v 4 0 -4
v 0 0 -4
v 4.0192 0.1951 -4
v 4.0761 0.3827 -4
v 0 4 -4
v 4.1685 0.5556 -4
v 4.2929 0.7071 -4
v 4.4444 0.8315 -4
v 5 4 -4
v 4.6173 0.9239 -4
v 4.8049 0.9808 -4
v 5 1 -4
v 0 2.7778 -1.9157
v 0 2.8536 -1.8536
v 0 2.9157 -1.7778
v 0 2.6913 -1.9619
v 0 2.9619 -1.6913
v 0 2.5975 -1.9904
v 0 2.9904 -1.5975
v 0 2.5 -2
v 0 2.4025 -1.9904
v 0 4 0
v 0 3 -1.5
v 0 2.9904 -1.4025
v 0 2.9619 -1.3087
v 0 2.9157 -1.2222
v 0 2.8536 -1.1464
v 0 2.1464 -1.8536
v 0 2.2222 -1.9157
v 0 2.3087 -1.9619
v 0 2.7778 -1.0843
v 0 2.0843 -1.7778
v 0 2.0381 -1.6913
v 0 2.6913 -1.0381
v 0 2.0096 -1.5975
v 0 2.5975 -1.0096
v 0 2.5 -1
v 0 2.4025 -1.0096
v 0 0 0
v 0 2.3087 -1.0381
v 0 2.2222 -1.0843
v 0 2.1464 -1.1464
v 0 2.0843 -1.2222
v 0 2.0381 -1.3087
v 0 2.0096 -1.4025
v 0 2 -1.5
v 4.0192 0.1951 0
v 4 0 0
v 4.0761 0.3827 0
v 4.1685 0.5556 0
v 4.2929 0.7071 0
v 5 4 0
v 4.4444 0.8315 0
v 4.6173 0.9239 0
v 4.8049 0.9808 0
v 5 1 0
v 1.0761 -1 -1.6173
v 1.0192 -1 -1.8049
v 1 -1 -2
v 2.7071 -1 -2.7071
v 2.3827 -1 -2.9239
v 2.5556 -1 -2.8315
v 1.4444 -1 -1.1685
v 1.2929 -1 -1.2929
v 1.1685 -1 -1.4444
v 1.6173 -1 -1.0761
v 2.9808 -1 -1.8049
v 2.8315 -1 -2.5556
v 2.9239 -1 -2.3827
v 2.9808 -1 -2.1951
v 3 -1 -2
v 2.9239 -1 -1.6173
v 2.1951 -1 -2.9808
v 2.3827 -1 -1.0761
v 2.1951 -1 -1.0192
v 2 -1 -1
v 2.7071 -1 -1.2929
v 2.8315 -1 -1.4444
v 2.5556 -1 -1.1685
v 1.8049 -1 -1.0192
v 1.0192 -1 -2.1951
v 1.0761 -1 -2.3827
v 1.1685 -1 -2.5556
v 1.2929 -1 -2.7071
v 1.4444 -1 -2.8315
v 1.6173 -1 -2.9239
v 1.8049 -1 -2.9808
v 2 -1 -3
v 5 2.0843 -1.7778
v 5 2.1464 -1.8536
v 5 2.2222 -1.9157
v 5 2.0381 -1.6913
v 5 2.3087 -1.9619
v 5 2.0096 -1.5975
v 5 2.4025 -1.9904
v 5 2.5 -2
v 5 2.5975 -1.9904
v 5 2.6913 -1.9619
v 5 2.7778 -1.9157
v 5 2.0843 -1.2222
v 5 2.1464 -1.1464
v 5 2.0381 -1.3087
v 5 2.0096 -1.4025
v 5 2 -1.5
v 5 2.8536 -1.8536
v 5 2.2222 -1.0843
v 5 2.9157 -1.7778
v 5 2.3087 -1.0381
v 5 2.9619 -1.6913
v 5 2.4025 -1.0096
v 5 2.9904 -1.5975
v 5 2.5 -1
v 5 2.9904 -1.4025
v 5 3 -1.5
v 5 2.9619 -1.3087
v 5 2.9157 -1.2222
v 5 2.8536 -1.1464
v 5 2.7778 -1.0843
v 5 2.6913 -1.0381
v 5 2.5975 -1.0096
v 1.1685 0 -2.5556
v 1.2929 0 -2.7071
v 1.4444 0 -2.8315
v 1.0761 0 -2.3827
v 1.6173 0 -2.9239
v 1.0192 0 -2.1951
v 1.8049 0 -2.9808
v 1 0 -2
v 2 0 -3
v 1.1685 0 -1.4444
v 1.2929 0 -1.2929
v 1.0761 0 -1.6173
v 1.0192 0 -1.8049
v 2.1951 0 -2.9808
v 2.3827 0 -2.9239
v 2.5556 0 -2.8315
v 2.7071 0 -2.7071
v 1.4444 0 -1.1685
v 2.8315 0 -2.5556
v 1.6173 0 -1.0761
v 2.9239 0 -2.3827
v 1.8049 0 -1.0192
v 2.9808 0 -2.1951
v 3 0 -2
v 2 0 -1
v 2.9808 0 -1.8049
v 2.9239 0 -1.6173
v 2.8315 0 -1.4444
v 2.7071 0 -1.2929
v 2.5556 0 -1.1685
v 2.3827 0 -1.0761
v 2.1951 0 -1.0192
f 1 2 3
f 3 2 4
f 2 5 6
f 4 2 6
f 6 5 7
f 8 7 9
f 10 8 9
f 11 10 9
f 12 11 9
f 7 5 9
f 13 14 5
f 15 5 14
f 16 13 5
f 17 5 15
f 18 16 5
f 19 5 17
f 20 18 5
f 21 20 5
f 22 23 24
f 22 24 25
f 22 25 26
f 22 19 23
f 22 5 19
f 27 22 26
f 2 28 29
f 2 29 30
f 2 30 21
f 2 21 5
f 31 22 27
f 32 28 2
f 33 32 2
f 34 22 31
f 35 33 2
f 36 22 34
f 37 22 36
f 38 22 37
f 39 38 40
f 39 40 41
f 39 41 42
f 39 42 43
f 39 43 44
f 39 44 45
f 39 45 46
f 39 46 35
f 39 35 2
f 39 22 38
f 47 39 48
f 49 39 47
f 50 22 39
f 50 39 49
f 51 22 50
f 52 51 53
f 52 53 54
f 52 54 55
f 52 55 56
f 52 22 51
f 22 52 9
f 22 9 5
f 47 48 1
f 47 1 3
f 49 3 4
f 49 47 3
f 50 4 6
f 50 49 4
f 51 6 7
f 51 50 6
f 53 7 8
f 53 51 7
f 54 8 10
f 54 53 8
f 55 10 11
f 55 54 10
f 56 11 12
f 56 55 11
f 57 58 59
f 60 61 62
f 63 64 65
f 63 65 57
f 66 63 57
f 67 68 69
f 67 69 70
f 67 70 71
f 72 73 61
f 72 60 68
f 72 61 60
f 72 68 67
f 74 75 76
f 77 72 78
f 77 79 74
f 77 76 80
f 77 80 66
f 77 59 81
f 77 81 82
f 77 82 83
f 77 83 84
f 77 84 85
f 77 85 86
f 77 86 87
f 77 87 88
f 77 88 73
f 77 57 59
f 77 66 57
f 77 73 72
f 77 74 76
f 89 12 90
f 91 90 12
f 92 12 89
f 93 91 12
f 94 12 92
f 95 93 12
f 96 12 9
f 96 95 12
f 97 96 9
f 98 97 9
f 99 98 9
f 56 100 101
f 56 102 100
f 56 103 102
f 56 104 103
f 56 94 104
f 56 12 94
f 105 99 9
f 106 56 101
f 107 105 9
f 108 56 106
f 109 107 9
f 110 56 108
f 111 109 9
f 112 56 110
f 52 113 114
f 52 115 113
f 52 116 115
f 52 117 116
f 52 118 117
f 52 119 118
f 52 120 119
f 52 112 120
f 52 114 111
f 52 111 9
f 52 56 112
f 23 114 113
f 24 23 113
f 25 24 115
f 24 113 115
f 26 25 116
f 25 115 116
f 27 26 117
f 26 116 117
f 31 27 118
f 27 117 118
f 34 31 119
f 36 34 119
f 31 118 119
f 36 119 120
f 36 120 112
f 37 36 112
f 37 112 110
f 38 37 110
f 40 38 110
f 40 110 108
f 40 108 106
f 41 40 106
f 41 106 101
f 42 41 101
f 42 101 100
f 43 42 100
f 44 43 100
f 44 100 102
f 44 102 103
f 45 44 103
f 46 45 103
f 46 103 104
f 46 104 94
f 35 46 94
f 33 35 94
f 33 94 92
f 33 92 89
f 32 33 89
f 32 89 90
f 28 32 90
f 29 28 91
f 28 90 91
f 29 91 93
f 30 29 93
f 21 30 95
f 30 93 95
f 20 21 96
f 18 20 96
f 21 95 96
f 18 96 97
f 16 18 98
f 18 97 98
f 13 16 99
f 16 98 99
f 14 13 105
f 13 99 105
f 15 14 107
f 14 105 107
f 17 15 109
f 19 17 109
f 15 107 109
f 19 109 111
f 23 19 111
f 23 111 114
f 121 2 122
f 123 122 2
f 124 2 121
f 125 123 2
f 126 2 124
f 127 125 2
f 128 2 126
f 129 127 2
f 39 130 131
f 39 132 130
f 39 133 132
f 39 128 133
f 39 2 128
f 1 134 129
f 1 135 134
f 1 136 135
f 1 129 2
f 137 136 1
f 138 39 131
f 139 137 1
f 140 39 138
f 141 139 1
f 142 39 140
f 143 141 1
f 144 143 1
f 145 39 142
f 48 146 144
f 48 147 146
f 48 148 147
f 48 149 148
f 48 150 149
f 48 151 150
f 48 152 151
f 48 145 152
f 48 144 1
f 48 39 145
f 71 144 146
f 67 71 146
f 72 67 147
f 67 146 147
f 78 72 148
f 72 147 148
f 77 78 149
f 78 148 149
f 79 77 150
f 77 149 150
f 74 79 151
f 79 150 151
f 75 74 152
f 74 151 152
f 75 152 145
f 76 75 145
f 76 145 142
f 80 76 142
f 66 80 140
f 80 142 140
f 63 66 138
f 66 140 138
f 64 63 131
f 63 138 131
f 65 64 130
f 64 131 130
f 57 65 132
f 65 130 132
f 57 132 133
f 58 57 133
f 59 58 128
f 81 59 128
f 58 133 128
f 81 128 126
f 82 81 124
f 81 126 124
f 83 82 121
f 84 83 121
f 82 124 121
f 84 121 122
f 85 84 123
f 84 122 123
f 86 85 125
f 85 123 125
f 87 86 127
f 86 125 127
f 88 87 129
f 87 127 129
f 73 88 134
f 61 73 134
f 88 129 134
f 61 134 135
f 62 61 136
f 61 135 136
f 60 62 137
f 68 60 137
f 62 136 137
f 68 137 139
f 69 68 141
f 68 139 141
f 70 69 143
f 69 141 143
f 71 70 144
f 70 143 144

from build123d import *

# Parameters (mm, degrees)
F1_DEPTH = 4
F2_R     = 1
F3_DEPTH = 1
F4_R     = 0.5
F5_DEPTH = 25


with BuildPart() as f1:
    # F0 (on Top) → F1 (new body)
    with BuildSketch(Plane.XY):
        with BuildLine():
            Line((0, 4), (0, 0))
            Line((0, 0), (4, 0))
            ThreePointArc((4, 0), (4.292893, 0.707107), (5, 1))
            Line((5, 1), (5, 4))
            Line((5, 4), (0, 4))
        make_face()
    extrude(amount=-F1_DEPTH)

    # F2 (on Front) → F3 (join)
    with BuildSketch(Plane.XZ):
        with Locations((2, -2)):
            Circle(F2_R)
    extrude(amount=F3_DEPTH)

    # F4 (on face) → F5 (cut)
    with BuildSketch(Plane.YZ.offset(5)):
        with Locations((2.5, -1.5)):
            Circle(F4_R)
    extrude(amount=-F5_DEPTH, mode=Mode.SUBTRACT)


solid = f1.part
